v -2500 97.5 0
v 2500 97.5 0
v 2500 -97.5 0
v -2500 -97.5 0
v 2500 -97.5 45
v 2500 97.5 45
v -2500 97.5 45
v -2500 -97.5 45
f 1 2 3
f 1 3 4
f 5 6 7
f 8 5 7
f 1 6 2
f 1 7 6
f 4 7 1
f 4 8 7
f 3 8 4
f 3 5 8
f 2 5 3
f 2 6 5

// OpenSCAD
linear_extrude(height = 45.0, twist = 0.0, scale = 1.0, slices = 1, center = false)
{
    scale([5000.0, 195.0])
    {
        M52();
    }
}

module M52()
{
    polygon
    (
        points =
        [
            [-0.5, -0.5], 
            [0.5, -0.5], 
            [0.5, 0.5], 
            [-0.5, 0.5]
        ],
        paths =
        [
            [0, 1, 2, 3]
        ]
    );
}
